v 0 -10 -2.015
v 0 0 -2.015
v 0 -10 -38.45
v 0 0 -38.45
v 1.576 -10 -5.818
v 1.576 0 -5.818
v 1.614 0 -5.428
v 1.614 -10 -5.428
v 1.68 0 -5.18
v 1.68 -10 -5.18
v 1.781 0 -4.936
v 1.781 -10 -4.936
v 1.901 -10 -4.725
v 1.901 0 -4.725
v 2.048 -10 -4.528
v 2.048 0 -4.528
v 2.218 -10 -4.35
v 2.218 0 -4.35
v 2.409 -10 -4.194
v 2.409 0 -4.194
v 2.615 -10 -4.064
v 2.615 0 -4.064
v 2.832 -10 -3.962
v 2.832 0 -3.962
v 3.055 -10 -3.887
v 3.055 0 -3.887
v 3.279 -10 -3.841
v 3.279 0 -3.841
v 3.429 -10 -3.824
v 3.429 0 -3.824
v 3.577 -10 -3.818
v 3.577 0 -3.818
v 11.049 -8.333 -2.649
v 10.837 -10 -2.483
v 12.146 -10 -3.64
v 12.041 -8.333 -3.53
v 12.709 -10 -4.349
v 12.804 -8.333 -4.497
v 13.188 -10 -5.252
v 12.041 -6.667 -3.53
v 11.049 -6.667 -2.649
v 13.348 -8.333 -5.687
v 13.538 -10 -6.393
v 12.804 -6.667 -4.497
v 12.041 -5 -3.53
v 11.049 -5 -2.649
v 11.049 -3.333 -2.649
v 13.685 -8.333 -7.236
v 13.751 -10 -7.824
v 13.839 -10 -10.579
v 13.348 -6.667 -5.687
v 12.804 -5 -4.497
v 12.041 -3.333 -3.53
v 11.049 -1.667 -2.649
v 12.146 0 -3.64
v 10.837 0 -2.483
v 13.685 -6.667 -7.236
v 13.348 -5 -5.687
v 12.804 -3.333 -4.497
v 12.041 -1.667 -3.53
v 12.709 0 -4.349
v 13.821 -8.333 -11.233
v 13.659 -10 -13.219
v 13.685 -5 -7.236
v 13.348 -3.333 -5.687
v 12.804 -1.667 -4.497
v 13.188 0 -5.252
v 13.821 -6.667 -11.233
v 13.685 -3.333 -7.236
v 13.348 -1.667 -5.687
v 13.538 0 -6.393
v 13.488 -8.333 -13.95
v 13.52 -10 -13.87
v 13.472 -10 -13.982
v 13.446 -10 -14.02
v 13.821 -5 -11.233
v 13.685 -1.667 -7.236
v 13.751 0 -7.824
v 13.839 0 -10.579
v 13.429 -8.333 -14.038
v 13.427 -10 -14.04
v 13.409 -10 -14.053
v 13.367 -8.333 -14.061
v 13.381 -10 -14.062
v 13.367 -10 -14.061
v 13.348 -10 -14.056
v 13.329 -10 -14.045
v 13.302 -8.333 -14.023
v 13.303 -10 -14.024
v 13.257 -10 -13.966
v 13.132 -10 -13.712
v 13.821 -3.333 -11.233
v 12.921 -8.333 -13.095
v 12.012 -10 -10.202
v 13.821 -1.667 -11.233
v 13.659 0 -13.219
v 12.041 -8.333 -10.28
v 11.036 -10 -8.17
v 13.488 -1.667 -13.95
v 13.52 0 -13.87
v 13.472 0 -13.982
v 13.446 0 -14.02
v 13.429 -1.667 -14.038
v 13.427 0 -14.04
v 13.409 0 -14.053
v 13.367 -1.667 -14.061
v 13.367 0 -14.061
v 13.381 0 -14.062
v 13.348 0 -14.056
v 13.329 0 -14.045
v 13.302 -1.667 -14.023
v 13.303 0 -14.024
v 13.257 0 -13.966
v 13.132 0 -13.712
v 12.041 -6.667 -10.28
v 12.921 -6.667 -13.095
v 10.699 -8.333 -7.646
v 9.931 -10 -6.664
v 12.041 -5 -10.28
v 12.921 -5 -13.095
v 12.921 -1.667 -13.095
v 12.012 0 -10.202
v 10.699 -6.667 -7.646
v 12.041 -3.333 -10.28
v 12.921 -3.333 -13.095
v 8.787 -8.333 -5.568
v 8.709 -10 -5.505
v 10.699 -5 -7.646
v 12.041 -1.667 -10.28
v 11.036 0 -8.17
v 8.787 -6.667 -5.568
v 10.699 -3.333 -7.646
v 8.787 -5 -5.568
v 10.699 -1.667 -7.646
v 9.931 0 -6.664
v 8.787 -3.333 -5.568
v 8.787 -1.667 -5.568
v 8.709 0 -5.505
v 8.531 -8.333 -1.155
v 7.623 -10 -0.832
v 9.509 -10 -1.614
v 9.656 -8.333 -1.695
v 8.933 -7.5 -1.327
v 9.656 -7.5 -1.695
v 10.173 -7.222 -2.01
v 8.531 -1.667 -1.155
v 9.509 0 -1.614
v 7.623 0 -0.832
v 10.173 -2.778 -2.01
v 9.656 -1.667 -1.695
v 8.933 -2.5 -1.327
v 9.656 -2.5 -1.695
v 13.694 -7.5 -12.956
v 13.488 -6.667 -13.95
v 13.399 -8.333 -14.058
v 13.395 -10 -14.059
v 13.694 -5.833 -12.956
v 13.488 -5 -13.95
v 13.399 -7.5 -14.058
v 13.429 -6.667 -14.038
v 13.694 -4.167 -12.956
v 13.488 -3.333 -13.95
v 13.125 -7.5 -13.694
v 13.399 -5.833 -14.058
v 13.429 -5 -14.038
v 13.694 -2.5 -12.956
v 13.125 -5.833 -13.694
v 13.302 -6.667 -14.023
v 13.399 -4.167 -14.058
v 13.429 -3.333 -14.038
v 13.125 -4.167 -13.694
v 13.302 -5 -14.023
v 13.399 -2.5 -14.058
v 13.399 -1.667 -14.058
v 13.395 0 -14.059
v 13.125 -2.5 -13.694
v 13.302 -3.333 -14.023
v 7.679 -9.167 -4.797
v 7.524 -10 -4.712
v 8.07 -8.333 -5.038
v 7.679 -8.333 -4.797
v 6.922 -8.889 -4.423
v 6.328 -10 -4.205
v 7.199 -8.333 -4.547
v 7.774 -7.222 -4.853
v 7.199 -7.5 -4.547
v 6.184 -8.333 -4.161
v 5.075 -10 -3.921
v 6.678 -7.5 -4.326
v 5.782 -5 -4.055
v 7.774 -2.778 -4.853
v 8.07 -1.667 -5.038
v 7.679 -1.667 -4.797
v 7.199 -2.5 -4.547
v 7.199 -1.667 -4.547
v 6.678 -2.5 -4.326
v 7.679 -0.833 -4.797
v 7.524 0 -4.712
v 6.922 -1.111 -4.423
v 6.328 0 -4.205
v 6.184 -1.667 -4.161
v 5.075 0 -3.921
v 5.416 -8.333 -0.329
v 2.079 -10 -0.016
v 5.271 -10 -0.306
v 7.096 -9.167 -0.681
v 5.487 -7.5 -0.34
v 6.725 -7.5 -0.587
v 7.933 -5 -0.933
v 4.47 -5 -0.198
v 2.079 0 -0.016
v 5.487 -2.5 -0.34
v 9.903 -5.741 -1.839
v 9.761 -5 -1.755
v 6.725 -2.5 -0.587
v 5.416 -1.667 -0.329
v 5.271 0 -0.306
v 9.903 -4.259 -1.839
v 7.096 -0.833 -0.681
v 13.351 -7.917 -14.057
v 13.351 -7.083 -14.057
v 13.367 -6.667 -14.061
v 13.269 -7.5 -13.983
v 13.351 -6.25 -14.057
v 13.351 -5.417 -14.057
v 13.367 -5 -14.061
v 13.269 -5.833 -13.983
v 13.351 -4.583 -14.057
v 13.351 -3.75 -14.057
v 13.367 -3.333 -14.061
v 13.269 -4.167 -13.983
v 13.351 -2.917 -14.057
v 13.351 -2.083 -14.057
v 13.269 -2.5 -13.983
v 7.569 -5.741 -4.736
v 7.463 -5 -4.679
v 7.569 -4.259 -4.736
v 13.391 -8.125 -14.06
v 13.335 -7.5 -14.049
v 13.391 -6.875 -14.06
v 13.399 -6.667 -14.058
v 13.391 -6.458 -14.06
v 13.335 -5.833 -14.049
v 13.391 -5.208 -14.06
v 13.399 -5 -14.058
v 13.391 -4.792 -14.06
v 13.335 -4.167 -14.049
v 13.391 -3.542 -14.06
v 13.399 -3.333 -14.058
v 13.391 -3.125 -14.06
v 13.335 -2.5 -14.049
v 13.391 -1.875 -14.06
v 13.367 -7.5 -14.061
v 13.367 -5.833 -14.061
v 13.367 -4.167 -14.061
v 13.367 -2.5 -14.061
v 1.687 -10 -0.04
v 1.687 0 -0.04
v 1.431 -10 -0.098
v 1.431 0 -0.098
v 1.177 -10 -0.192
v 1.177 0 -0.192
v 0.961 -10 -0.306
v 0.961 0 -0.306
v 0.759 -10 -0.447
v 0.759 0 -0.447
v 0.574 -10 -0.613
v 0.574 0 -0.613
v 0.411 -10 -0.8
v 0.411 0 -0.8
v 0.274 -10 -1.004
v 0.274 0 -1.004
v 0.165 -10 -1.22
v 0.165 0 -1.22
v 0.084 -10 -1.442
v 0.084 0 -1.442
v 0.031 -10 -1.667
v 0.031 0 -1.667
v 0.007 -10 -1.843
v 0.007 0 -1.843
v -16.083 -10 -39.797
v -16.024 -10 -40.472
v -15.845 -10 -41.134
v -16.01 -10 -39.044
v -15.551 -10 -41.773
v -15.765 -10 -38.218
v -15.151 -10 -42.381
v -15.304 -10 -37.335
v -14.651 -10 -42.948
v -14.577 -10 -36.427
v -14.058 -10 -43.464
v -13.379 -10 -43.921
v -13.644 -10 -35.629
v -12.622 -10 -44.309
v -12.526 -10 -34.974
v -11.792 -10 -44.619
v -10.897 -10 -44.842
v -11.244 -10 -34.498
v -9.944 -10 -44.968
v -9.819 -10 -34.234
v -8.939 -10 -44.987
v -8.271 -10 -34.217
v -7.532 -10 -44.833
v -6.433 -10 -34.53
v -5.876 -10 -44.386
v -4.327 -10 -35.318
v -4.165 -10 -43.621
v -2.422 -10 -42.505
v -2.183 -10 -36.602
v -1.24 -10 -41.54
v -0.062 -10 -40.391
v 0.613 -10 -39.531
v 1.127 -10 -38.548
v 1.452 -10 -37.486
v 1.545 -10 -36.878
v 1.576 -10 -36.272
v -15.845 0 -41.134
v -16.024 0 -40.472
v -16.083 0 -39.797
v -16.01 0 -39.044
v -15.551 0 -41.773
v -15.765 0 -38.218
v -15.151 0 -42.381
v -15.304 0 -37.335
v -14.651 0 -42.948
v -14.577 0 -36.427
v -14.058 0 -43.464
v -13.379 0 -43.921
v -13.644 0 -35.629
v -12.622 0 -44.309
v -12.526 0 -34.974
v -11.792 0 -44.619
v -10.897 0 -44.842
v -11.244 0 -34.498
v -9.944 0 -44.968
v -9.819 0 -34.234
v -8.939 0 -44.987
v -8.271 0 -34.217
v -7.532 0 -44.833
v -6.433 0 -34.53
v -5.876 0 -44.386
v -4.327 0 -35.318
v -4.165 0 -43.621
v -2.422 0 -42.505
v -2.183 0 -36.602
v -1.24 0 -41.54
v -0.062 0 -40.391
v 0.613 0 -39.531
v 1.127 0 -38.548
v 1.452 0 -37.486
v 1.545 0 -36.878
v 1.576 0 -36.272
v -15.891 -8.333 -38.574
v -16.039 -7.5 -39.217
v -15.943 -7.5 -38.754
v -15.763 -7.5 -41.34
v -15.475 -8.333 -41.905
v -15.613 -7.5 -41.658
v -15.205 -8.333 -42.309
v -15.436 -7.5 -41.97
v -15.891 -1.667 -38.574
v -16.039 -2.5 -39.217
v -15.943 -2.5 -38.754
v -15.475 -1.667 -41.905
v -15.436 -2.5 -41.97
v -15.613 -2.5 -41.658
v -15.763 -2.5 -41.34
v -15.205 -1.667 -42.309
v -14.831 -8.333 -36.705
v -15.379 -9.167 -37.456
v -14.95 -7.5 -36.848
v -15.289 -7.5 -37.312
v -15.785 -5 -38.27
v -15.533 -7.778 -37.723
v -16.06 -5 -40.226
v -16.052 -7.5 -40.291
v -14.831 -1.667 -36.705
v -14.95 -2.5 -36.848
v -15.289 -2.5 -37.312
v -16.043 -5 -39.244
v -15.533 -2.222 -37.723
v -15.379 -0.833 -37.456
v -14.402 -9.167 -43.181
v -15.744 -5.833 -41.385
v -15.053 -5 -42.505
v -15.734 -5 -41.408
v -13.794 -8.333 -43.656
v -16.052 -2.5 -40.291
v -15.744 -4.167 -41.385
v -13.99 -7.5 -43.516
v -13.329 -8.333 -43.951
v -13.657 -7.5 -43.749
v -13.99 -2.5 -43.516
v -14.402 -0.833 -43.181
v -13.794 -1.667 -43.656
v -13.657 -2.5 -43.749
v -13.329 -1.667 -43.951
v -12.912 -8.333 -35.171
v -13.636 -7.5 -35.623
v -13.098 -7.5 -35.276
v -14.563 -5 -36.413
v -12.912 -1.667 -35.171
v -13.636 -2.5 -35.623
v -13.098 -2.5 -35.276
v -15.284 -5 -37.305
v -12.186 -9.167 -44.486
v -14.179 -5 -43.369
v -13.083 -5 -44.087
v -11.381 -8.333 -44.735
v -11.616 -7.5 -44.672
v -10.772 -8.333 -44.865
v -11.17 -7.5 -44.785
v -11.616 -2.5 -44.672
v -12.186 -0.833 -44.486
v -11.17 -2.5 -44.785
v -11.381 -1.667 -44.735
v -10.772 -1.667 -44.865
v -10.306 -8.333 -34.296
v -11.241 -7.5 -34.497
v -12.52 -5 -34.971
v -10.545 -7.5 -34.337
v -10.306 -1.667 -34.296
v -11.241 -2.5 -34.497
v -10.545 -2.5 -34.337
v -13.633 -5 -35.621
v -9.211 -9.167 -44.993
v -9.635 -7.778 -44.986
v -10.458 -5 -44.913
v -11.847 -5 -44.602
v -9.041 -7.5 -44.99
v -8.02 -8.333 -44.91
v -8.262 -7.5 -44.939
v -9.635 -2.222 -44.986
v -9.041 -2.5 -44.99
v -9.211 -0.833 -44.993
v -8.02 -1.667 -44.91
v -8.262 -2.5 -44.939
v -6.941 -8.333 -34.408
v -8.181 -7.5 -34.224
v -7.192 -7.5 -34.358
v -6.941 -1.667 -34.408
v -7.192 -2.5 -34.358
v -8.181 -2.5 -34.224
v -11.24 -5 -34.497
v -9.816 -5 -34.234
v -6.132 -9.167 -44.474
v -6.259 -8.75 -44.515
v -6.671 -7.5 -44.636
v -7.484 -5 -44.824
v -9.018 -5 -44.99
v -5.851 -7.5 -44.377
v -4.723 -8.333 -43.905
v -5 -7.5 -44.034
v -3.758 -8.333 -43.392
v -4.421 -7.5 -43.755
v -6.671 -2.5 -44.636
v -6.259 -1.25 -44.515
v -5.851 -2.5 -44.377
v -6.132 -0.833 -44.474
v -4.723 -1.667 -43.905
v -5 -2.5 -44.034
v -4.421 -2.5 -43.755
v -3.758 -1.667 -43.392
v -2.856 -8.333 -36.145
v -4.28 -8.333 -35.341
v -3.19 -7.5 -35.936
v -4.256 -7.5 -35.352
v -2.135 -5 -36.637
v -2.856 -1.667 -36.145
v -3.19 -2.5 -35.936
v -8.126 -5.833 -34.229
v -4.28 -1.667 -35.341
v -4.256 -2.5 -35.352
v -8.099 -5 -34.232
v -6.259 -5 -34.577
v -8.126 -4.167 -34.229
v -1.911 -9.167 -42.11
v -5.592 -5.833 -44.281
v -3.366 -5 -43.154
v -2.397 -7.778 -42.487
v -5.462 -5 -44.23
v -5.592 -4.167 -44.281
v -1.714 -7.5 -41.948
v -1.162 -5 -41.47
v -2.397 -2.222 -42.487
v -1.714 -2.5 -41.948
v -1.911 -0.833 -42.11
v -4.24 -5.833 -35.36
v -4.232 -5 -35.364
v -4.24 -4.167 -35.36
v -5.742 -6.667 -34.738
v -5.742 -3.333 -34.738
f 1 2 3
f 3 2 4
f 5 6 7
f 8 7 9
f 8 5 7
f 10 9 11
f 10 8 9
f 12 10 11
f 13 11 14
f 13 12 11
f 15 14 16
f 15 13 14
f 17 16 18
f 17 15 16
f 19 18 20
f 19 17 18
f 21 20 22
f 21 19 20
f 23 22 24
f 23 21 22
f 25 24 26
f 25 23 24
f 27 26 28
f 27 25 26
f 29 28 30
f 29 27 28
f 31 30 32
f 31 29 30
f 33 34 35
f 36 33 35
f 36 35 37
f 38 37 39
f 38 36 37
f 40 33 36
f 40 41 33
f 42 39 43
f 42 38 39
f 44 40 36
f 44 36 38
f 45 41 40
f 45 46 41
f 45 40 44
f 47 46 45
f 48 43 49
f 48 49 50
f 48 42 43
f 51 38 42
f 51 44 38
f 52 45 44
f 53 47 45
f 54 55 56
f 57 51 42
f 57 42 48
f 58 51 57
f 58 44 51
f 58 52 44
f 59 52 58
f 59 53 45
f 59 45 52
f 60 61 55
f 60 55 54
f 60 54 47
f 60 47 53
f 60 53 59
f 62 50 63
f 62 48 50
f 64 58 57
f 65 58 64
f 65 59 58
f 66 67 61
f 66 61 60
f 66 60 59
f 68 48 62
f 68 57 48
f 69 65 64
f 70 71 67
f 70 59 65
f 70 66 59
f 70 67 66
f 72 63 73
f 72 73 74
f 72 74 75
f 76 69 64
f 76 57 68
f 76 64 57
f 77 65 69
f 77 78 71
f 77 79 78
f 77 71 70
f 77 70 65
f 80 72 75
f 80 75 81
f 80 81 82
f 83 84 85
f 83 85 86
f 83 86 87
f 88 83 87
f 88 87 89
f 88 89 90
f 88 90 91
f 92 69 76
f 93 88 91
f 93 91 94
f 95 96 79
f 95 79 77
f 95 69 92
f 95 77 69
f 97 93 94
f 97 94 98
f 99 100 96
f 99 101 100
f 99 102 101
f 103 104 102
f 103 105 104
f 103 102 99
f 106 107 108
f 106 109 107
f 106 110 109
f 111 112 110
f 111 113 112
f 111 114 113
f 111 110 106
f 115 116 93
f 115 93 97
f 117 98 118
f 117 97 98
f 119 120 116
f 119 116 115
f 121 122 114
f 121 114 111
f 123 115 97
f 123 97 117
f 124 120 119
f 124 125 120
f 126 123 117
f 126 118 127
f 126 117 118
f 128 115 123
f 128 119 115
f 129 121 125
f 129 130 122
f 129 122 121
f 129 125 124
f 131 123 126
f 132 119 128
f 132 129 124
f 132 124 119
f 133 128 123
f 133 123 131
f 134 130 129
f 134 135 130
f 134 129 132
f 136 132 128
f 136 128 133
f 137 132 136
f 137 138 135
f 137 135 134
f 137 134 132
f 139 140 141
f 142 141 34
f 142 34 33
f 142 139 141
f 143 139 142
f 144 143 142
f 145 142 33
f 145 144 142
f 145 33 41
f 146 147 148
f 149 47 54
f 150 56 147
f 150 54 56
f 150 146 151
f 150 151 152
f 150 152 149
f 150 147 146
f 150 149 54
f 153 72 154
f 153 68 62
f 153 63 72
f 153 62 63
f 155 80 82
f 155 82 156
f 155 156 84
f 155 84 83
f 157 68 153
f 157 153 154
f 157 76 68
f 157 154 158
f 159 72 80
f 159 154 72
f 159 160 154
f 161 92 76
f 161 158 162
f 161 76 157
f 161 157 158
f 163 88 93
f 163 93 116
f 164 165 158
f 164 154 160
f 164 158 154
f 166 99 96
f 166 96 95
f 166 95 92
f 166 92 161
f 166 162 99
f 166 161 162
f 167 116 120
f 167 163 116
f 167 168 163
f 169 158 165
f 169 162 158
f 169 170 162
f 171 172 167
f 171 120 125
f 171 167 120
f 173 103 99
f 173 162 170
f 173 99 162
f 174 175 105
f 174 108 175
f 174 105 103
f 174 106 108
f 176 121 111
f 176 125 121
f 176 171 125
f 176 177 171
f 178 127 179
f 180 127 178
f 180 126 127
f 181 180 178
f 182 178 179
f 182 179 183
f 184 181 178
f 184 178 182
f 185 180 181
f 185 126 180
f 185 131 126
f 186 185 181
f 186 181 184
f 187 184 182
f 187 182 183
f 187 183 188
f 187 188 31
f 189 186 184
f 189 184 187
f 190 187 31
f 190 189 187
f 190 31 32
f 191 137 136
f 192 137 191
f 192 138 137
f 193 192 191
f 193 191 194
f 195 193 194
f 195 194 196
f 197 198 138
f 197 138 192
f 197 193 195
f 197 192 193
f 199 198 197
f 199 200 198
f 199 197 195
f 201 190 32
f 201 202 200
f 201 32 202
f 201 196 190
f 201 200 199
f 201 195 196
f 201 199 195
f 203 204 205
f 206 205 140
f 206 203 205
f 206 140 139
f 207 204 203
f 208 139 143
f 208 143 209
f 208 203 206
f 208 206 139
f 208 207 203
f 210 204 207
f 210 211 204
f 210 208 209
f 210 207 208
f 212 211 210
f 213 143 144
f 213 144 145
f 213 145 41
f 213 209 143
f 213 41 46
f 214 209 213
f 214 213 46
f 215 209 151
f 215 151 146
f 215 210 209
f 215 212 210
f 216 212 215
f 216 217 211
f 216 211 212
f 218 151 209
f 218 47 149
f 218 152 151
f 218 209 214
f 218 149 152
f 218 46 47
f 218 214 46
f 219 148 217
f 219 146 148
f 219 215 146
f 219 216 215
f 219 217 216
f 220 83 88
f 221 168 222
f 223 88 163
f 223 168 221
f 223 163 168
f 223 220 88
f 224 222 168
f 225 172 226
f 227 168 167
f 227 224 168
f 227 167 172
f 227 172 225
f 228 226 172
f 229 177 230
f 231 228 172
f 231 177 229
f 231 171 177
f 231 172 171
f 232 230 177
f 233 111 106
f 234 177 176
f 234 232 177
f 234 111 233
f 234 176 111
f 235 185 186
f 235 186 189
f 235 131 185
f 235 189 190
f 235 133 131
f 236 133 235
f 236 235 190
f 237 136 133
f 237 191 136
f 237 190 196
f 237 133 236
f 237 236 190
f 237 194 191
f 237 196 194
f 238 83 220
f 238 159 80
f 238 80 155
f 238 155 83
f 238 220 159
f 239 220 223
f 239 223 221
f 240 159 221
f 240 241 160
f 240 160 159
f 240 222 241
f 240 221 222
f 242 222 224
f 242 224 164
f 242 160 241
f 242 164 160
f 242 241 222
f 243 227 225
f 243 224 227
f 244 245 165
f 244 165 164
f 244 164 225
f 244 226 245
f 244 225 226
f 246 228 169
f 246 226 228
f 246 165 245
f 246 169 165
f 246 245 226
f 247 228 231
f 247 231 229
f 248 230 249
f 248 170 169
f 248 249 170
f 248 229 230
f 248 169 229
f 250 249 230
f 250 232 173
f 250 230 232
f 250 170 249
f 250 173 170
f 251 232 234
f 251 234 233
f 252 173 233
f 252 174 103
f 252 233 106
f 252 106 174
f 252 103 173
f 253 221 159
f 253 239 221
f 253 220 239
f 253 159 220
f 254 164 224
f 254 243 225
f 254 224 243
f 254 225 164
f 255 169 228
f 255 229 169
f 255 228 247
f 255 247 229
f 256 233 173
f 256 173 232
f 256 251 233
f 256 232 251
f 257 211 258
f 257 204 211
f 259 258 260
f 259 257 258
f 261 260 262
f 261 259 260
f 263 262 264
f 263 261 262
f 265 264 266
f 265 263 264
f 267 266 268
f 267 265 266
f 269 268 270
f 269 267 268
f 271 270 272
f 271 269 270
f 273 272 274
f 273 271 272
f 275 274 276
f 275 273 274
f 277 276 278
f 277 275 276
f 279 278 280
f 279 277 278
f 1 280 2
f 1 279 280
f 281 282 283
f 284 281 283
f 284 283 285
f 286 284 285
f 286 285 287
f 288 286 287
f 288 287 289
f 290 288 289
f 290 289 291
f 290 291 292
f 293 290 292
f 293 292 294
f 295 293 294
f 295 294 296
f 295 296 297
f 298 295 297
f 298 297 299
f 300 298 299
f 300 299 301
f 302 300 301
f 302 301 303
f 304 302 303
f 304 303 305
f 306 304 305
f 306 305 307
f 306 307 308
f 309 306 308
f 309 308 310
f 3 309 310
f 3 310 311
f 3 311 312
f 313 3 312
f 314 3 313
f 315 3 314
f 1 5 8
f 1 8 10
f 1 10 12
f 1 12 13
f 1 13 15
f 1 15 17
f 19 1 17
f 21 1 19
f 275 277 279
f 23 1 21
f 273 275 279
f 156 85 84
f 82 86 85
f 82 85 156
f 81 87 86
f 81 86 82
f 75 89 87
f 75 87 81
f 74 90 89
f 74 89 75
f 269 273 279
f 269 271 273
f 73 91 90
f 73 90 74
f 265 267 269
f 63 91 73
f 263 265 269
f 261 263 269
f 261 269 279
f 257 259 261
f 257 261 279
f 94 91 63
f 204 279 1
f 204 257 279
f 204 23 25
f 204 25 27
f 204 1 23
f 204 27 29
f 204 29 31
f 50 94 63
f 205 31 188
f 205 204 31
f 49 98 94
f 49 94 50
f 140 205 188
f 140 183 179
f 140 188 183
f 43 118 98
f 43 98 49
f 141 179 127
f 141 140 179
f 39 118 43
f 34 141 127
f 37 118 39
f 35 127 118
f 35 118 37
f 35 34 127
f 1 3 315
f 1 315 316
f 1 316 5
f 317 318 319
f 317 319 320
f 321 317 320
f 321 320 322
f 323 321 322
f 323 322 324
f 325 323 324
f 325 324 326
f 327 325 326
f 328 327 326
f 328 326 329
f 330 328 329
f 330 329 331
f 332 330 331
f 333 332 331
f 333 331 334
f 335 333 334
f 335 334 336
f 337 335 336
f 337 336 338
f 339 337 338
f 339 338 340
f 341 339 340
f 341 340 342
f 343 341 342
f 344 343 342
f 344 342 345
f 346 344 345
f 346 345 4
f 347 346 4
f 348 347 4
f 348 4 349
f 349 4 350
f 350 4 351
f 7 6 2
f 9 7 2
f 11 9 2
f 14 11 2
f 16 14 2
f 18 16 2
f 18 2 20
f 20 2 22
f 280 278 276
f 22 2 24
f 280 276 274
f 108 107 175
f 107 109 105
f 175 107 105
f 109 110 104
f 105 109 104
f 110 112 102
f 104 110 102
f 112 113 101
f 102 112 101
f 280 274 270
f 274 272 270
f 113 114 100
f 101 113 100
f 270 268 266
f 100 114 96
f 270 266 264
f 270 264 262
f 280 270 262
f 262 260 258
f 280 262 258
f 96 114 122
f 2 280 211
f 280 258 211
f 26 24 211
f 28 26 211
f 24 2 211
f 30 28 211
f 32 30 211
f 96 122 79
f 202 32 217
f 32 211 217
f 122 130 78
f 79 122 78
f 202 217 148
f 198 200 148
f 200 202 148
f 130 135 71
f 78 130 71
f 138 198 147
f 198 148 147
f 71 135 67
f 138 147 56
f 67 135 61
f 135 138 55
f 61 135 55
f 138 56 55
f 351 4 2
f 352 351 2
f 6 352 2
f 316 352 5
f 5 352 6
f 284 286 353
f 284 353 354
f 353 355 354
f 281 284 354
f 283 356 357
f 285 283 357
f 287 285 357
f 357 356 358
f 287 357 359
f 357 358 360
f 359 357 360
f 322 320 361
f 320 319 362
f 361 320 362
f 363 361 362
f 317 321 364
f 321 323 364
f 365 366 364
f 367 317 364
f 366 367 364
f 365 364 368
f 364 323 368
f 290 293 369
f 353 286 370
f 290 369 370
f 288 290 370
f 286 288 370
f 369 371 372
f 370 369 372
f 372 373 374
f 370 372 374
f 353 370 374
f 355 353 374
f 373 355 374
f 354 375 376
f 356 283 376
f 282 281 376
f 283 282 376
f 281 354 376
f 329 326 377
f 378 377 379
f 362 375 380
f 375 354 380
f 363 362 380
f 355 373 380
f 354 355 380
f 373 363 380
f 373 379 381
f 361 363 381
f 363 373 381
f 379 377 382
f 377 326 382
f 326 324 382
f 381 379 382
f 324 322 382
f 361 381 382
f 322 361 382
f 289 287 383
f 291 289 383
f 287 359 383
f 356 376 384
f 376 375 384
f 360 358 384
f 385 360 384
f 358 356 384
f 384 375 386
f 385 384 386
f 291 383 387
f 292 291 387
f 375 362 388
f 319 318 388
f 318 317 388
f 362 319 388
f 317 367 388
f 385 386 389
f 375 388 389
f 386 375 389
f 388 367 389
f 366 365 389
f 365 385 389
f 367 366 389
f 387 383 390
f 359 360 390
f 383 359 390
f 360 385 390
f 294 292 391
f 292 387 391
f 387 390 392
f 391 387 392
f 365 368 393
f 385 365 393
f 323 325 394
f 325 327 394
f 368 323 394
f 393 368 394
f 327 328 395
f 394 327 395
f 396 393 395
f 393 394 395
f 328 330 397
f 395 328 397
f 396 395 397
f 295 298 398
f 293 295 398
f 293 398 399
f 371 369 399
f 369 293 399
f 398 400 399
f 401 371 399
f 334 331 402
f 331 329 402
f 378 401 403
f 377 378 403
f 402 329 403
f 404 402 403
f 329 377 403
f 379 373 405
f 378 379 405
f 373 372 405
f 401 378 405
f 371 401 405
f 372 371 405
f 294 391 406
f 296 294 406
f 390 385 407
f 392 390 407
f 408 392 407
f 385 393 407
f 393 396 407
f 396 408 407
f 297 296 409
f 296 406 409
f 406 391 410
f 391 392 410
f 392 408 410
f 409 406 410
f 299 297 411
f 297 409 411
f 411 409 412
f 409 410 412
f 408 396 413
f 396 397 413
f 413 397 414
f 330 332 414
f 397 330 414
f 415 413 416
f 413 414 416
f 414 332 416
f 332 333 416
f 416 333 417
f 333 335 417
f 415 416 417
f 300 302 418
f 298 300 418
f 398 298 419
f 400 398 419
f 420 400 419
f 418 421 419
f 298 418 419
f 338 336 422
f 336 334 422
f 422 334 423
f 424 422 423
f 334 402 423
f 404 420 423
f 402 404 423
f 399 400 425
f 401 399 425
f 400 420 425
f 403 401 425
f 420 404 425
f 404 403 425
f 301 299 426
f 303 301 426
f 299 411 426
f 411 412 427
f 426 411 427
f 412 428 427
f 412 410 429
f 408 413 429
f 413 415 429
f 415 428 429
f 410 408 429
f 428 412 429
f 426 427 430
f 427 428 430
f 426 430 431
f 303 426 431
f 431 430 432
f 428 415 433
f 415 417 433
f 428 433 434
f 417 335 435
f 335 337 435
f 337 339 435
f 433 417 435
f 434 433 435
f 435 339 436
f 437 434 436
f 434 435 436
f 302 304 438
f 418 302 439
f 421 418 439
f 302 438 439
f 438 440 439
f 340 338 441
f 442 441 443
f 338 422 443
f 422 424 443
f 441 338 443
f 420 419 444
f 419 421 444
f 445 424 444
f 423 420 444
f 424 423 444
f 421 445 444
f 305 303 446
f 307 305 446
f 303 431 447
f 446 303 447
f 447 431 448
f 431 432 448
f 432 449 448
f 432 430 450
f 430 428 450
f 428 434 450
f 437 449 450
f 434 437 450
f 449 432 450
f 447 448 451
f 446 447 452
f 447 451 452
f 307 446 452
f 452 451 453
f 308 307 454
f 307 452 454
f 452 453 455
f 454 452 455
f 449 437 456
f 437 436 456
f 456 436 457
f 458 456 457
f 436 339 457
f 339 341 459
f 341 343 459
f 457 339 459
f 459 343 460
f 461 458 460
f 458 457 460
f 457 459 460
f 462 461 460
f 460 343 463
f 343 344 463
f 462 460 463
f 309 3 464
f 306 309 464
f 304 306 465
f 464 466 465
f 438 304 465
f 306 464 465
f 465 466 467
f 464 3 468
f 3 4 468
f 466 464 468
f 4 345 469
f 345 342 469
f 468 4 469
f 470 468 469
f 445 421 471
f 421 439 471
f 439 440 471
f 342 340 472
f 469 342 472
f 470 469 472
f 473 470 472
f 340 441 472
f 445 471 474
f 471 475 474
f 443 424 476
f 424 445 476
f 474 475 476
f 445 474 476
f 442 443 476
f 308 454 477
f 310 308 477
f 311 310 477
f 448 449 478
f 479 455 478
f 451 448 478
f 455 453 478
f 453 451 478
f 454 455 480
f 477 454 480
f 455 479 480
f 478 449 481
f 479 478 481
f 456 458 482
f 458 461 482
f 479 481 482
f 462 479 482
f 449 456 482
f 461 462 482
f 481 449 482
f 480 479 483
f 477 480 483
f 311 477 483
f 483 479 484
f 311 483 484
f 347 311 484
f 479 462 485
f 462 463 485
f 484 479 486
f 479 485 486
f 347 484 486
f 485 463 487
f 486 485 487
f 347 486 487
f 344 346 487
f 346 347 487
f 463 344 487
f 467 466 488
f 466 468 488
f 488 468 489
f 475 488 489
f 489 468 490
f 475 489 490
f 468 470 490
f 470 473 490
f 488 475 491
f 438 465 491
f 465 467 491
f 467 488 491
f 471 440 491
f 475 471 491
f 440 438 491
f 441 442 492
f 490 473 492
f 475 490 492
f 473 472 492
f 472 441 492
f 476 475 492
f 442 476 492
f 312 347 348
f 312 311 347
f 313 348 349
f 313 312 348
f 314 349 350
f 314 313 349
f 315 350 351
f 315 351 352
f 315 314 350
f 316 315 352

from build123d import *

# Parameters (mm, degrees)
PAD_DEPTH   = 10
FILLET_R    = 6
FILLET001_R = 2
FILLET002_R = 2


with BuildPart() as part:
    # Sketch → Pad (new body)
    with BuildSketch(Plane.XZ):
        with BuildLine():
            Line((0, 0), (0, -38.45))
            add(Edge.make_bspline(
                [(0, -38.45), (-8.348789, -30.265072), (-24.813946, -40.91254), (-6.263206, -48.815815), (1.575816, -38.447519)],
                knots=[0, 0, 0, 0, 0.5, 1, 1, 1, 1], degree=3))
            Line((1.575816, -38.447519), (1.575816, -3.957519))
            add(Edge.make_bspline(
                [(1.58, 0), (7.444154, -0.157071), (11.691713, -2.783852), (14.206716, -5.913633), (13.59183, -16.980009), (12.355664, -9.863976), (9.232493, -5.24333), (5.368032, -3.463092), (1.575816, -3.957519)],
                knots=[0, 0, 0, 0, 0.166667, 0.333333, 0.5, 0.666667, 0.833333, 1, 1, 1, 1], degree=3))
            Line((1.58, 0), (0, 0))
        make_face()
    extrude(amount=PAD_DEPTH)

    # Fillet
    fillet_edges = [part.edges().sort_by_distance(p)[0] for p in [
        (1.575816, -5, -38.447519),
    ]]
    fillet(fillet_edges, radius=FILLET_R)

    # Fillet001
    fillet001_edges = [part.edges().sort_by_distance(p)[0] for p in [
        (1.575816, -5, -3.957519),
    ]]
    fillet(fillet001_edges, radius=FILLET001_R)

    # Fillet002
    fillet002_edges = [part.edges().sort_by_distance(p)[0] for p in [
        (0, -5, 0),
    ]]
    fillet(fillet002_edges, radius=FILLET002_R)


solid = part.part
